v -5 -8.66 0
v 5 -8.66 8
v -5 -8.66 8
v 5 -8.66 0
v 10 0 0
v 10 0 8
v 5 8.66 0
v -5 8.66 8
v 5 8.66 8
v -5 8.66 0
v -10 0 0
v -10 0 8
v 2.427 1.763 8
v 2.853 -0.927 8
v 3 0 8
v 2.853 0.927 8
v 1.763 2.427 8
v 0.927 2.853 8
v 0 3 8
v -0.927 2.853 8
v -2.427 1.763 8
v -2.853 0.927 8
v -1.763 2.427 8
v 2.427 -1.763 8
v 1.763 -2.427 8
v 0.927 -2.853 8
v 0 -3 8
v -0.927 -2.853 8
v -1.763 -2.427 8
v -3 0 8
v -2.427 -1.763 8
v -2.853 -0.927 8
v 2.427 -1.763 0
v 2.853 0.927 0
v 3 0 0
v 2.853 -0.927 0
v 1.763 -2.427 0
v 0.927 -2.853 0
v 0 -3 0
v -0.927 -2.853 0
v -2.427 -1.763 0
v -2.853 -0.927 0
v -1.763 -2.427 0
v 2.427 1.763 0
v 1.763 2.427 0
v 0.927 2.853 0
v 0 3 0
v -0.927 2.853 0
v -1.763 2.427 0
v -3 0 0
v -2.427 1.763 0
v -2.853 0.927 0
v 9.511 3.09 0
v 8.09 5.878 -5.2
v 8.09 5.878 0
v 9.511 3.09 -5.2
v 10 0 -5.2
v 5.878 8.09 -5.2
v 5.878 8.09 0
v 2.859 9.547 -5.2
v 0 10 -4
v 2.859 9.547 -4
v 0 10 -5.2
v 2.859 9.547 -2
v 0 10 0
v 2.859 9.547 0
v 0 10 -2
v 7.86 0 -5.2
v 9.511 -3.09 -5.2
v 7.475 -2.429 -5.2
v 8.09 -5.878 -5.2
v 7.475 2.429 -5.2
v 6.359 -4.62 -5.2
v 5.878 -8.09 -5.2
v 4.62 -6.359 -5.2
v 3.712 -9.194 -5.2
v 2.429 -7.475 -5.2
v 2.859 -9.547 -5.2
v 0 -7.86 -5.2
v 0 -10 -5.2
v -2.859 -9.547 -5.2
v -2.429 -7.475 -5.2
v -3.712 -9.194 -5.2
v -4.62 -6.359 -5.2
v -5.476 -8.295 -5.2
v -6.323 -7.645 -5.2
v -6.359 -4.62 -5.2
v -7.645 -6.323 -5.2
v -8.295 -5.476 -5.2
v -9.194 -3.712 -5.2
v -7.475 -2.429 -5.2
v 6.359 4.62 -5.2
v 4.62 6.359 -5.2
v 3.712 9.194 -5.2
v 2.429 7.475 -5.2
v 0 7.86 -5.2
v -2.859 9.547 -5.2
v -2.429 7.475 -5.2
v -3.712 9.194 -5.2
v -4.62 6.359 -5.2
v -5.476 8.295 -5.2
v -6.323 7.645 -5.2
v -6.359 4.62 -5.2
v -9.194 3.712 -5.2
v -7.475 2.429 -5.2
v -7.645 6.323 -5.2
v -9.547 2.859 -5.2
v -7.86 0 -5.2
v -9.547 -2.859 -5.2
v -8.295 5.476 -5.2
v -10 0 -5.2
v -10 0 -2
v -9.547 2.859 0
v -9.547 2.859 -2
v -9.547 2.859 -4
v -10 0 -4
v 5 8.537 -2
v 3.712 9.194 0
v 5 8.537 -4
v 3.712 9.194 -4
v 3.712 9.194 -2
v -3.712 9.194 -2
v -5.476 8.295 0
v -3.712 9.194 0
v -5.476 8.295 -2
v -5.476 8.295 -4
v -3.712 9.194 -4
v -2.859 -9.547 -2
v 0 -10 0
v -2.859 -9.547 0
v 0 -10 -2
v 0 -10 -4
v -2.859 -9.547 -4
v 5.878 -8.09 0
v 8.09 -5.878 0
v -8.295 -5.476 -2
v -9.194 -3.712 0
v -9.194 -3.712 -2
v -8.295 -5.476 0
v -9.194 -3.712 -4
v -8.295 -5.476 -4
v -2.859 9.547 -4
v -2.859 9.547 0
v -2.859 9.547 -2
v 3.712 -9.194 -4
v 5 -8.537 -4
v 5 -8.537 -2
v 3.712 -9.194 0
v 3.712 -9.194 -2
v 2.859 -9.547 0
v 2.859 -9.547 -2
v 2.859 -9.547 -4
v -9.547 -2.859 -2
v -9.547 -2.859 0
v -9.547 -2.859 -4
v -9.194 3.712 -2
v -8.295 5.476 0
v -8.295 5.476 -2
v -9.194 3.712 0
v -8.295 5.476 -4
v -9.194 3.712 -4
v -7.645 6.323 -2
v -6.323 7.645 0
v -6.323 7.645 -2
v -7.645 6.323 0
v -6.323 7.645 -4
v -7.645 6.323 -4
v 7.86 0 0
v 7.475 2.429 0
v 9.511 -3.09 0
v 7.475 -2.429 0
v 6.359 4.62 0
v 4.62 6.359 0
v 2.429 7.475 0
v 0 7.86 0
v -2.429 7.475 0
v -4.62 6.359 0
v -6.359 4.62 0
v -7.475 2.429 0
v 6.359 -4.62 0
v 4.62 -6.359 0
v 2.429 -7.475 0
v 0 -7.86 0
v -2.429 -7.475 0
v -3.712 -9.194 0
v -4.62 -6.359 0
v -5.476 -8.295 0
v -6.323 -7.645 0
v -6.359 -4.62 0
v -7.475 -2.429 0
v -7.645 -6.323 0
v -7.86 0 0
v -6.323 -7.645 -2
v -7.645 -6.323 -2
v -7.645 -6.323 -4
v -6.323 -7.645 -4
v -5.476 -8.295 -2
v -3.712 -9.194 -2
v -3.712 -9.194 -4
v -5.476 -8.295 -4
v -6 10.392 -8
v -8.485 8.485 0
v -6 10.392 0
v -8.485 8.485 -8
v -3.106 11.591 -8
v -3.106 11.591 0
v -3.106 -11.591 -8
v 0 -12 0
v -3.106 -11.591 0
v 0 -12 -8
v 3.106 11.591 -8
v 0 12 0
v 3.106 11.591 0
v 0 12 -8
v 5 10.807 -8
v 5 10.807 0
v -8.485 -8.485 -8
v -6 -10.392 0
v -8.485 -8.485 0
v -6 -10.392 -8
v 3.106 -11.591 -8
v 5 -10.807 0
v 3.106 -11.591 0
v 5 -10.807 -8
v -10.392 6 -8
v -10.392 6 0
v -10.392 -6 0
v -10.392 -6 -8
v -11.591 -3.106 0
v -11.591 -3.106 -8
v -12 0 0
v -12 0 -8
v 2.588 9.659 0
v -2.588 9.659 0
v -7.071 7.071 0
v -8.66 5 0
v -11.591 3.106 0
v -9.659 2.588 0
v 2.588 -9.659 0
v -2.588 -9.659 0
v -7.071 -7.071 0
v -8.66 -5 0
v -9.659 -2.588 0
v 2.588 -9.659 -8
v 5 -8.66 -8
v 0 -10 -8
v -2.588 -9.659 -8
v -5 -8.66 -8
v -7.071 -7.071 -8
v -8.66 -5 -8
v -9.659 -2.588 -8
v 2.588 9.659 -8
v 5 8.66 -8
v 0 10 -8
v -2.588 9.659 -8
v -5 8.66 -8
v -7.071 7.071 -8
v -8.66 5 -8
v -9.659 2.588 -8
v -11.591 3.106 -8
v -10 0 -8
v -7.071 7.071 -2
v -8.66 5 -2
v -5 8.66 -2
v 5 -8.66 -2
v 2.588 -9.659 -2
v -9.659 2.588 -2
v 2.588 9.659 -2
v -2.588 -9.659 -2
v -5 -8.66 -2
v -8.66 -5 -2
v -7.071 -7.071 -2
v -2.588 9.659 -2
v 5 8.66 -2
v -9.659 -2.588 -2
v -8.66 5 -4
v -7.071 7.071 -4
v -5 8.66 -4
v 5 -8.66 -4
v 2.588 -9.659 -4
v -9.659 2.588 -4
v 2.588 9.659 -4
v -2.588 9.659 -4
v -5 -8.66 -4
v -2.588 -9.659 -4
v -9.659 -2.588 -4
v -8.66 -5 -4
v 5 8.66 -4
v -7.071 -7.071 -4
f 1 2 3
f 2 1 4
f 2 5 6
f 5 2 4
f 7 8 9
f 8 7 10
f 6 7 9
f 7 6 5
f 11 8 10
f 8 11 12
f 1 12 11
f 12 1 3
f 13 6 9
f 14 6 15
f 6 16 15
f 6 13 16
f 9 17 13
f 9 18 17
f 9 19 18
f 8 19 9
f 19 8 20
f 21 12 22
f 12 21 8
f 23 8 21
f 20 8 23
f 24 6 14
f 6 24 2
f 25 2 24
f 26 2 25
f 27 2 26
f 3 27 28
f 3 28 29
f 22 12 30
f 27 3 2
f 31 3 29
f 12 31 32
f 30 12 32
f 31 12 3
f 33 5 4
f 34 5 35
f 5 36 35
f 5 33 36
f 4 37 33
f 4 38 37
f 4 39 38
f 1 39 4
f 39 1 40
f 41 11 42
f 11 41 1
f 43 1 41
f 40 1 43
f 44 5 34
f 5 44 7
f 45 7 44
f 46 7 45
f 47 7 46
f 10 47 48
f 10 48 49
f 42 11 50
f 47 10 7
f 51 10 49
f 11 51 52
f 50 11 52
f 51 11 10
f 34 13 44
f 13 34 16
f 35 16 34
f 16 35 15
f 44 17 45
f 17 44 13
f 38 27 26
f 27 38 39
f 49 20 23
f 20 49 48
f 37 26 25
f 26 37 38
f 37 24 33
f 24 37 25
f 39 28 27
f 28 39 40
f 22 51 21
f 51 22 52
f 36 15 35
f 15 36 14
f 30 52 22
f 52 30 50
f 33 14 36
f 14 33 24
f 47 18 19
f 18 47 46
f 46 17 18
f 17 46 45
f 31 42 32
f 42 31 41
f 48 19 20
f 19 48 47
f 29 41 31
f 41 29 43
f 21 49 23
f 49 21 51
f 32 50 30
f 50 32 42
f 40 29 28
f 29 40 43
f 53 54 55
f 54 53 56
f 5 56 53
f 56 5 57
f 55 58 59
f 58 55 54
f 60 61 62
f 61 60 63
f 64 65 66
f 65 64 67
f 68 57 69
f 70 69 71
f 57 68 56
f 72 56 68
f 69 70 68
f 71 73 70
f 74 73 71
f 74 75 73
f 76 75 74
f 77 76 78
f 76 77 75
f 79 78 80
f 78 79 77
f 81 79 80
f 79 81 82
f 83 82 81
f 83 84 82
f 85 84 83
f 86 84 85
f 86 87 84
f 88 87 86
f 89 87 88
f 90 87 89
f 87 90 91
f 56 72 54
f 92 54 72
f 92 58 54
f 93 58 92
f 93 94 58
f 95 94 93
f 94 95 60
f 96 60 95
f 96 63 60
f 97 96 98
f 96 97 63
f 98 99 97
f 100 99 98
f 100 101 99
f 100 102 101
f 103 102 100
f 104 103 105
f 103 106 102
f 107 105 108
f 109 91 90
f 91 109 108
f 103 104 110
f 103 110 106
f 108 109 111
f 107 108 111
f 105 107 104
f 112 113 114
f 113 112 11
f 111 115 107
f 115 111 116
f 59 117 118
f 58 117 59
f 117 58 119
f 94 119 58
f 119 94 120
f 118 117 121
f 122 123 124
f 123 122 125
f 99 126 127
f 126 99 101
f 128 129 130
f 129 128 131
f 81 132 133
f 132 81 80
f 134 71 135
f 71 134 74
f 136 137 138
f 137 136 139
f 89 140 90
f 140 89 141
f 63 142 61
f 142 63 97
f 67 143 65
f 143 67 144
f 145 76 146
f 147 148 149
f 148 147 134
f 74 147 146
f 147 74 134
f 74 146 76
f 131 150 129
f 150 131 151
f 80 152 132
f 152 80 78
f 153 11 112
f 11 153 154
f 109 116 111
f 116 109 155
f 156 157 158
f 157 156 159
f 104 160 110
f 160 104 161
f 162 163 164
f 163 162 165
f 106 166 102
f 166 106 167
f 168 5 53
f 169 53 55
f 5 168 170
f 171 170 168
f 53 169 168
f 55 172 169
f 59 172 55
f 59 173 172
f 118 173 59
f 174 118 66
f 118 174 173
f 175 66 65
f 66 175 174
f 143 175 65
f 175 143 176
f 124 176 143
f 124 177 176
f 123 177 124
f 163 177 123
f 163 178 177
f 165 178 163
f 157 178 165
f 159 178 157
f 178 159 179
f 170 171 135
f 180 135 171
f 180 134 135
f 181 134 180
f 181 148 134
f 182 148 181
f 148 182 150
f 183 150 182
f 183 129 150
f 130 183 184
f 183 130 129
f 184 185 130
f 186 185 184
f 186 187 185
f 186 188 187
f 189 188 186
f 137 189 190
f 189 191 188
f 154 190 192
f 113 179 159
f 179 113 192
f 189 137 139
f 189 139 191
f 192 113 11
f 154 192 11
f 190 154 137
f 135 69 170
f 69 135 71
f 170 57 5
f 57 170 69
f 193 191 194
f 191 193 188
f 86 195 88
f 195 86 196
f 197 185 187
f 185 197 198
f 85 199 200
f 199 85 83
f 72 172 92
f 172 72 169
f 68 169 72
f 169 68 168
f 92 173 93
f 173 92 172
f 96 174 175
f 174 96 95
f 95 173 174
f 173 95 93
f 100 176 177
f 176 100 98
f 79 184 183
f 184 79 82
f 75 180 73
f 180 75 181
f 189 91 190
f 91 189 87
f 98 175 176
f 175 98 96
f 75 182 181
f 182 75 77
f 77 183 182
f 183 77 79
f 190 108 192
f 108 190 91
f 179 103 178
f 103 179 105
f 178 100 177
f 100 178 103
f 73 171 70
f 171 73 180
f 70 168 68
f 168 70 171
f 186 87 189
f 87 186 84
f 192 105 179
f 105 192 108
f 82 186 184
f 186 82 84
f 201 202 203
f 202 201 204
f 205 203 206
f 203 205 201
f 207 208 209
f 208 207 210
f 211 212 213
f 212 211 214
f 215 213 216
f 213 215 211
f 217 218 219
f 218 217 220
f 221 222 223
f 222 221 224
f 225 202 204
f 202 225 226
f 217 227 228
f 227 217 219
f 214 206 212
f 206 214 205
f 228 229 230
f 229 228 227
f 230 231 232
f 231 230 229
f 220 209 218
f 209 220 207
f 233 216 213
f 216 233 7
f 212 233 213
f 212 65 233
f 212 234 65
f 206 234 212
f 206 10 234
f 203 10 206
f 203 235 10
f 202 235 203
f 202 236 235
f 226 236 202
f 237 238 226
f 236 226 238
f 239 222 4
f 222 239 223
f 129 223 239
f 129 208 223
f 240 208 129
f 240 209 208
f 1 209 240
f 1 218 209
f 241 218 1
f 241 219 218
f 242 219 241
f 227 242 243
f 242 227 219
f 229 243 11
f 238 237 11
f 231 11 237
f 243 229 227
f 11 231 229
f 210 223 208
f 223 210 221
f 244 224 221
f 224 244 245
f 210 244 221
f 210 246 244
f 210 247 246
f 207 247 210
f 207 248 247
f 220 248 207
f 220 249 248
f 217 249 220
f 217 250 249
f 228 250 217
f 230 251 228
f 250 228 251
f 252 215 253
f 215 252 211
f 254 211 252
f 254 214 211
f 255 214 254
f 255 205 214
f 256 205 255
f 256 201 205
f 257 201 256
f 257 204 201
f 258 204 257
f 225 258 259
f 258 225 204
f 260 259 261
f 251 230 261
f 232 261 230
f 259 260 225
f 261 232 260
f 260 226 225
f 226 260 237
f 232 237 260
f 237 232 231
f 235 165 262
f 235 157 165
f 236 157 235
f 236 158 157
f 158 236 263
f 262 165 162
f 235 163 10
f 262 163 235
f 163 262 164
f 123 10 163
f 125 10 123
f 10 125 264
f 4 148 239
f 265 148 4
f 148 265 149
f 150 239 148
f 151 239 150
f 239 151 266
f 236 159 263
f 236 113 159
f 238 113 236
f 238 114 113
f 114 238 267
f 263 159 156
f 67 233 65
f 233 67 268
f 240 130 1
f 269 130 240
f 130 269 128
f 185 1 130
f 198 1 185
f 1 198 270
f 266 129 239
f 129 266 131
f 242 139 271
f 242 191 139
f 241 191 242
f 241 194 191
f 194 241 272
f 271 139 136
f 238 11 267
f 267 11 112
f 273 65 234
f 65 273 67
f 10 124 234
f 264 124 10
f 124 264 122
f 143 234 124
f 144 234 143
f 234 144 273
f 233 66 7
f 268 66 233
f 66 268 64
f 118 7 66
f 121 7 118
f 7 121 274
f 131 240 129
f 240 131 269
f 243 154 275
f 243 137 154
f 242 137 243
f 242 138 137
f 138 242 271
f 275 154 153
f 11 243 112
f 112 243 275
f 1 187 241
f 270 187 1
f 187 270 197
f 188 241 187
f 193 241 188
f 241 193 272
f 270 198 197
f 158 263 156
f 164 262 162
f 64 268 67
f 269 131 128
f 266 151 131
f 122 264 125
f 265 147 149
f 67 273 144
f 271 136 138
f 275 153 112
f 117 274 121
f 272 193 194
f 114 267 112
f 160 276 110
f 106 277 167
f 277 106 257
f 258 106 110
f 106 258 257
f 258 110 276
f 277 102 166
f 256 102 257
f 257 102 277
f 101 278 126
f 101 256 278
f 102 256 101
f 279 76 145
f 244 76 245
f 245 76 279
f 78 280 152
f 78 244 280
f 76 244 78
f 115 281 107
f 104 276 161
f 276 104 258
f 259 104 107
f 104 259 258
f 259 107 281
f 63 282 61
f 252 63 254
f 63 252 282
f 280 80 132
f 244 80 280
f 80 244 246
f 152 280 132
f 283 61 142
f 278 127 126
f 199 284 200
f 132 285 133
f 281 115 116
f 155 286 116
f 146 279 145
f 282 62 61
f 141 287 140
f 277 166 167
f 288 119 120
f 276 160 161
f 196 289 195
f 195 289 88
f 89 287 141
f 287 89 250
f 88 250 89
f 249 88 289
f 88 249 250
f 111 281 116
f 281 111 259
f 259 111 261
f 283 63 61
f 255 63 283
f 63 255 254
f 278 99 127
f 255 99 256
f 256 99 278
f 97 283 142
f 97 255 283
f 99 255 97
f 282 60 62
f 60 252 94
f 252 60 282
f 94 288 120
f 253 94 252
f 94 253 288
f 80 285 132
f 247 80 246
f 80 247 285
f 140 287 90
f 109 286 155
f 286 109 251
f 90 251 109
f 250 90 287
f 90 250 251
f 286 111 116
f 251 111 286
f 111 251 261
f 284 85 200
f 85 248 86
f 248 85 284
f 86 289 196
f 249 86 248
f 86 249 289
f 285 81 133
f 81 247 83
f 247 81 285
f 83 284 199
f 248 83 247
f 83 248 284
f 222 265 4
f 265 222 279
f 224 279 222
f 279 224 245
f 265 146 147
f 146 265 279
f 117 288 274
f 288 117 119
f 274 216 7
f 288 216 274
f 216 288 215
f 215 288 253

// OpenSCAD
show_terminal_nut = true;
show_lower_terminal_cover = true;

module end_of_customization();

module m6_terminal_nut() {
  $fn = 20; // Adjust the number of facets for smoothness
    

  // Dimensions
  stud_height = 6; // Height of the M6 stud
  nut_height = 5.2; // Per ISO standard.  Real nuts are more like 4.4 mm.
  nut_across_points = 14.72; // Across points of the 10 mm nut
  cover_height = stud_height + nut_height; // Height of the cover

  // Inner diameter of the annulus (to clear the nut across points)
  annulus_id = nut_across_points + 1; // Adjust as needed to provide clearance

  // Outer diameter and height of the cover
  cover_od = 20;

  // Top portion (screws onto M6 stud)
  translate([0, 0, 0]) {
      difference() {
          translate([0, 0, 0]) cylinder(h=stud_height+2, d = cover_od, $fn=6);      
          cylinder(h = stud_height+10, d = 6); 

    }
  }

  // Lower portion (covers the nut)
  
  translate([0, 0, -nut_height]) {
    difference() {
      cylinder(h = nut_height, d = cover_od); // Outer cylinder
      translate([0, 0, -nut_height])cylinder(h = nut_height + 10, d = annulus_id); // Inner cylinder (annulus)
    }
  }
}

module lower_terminal_cover(height) {
  $fn = 24; // Adjust the number of facets for smoothness

  // Dimensions
  wall_thickness = 2; // Wall thickness for the outer cover
  stud_height = 6; // Height of the M6 stud
  a_lot = 50;
  // Outer diameter and height of the cover
  cover_od = 20;

  // Outer cover retained by the nut) {
    translate([0, 0, -height]) {
        difference([0, 0, -height]) {
          cylinder(d = cover_od + 2 * wall_thickness, h=height);
          translate([0, 0, height-wall_thickness]) cylinder(d = cover_od, h=4);
          cylinder(d = cover_od - 2 * wall_thickness, h=4*height, center=true);
          translate([0, 0, height-2*wall_thickness - a_lot]) cylinder(d = cover_od, h=a_lot);
          translate([55, 0, 0]) cube([100, 100, 100], center=true);
        }

    }

}

// Example usage:
if (show_terminal_nut) {
    m6_terminal_nut(); // Top portion (terminal nut)
}
if (show_lower_terminal_cover) {
    lower_terminal_cover(8); // Lower portion (outer cover) with height = 8mm
}
